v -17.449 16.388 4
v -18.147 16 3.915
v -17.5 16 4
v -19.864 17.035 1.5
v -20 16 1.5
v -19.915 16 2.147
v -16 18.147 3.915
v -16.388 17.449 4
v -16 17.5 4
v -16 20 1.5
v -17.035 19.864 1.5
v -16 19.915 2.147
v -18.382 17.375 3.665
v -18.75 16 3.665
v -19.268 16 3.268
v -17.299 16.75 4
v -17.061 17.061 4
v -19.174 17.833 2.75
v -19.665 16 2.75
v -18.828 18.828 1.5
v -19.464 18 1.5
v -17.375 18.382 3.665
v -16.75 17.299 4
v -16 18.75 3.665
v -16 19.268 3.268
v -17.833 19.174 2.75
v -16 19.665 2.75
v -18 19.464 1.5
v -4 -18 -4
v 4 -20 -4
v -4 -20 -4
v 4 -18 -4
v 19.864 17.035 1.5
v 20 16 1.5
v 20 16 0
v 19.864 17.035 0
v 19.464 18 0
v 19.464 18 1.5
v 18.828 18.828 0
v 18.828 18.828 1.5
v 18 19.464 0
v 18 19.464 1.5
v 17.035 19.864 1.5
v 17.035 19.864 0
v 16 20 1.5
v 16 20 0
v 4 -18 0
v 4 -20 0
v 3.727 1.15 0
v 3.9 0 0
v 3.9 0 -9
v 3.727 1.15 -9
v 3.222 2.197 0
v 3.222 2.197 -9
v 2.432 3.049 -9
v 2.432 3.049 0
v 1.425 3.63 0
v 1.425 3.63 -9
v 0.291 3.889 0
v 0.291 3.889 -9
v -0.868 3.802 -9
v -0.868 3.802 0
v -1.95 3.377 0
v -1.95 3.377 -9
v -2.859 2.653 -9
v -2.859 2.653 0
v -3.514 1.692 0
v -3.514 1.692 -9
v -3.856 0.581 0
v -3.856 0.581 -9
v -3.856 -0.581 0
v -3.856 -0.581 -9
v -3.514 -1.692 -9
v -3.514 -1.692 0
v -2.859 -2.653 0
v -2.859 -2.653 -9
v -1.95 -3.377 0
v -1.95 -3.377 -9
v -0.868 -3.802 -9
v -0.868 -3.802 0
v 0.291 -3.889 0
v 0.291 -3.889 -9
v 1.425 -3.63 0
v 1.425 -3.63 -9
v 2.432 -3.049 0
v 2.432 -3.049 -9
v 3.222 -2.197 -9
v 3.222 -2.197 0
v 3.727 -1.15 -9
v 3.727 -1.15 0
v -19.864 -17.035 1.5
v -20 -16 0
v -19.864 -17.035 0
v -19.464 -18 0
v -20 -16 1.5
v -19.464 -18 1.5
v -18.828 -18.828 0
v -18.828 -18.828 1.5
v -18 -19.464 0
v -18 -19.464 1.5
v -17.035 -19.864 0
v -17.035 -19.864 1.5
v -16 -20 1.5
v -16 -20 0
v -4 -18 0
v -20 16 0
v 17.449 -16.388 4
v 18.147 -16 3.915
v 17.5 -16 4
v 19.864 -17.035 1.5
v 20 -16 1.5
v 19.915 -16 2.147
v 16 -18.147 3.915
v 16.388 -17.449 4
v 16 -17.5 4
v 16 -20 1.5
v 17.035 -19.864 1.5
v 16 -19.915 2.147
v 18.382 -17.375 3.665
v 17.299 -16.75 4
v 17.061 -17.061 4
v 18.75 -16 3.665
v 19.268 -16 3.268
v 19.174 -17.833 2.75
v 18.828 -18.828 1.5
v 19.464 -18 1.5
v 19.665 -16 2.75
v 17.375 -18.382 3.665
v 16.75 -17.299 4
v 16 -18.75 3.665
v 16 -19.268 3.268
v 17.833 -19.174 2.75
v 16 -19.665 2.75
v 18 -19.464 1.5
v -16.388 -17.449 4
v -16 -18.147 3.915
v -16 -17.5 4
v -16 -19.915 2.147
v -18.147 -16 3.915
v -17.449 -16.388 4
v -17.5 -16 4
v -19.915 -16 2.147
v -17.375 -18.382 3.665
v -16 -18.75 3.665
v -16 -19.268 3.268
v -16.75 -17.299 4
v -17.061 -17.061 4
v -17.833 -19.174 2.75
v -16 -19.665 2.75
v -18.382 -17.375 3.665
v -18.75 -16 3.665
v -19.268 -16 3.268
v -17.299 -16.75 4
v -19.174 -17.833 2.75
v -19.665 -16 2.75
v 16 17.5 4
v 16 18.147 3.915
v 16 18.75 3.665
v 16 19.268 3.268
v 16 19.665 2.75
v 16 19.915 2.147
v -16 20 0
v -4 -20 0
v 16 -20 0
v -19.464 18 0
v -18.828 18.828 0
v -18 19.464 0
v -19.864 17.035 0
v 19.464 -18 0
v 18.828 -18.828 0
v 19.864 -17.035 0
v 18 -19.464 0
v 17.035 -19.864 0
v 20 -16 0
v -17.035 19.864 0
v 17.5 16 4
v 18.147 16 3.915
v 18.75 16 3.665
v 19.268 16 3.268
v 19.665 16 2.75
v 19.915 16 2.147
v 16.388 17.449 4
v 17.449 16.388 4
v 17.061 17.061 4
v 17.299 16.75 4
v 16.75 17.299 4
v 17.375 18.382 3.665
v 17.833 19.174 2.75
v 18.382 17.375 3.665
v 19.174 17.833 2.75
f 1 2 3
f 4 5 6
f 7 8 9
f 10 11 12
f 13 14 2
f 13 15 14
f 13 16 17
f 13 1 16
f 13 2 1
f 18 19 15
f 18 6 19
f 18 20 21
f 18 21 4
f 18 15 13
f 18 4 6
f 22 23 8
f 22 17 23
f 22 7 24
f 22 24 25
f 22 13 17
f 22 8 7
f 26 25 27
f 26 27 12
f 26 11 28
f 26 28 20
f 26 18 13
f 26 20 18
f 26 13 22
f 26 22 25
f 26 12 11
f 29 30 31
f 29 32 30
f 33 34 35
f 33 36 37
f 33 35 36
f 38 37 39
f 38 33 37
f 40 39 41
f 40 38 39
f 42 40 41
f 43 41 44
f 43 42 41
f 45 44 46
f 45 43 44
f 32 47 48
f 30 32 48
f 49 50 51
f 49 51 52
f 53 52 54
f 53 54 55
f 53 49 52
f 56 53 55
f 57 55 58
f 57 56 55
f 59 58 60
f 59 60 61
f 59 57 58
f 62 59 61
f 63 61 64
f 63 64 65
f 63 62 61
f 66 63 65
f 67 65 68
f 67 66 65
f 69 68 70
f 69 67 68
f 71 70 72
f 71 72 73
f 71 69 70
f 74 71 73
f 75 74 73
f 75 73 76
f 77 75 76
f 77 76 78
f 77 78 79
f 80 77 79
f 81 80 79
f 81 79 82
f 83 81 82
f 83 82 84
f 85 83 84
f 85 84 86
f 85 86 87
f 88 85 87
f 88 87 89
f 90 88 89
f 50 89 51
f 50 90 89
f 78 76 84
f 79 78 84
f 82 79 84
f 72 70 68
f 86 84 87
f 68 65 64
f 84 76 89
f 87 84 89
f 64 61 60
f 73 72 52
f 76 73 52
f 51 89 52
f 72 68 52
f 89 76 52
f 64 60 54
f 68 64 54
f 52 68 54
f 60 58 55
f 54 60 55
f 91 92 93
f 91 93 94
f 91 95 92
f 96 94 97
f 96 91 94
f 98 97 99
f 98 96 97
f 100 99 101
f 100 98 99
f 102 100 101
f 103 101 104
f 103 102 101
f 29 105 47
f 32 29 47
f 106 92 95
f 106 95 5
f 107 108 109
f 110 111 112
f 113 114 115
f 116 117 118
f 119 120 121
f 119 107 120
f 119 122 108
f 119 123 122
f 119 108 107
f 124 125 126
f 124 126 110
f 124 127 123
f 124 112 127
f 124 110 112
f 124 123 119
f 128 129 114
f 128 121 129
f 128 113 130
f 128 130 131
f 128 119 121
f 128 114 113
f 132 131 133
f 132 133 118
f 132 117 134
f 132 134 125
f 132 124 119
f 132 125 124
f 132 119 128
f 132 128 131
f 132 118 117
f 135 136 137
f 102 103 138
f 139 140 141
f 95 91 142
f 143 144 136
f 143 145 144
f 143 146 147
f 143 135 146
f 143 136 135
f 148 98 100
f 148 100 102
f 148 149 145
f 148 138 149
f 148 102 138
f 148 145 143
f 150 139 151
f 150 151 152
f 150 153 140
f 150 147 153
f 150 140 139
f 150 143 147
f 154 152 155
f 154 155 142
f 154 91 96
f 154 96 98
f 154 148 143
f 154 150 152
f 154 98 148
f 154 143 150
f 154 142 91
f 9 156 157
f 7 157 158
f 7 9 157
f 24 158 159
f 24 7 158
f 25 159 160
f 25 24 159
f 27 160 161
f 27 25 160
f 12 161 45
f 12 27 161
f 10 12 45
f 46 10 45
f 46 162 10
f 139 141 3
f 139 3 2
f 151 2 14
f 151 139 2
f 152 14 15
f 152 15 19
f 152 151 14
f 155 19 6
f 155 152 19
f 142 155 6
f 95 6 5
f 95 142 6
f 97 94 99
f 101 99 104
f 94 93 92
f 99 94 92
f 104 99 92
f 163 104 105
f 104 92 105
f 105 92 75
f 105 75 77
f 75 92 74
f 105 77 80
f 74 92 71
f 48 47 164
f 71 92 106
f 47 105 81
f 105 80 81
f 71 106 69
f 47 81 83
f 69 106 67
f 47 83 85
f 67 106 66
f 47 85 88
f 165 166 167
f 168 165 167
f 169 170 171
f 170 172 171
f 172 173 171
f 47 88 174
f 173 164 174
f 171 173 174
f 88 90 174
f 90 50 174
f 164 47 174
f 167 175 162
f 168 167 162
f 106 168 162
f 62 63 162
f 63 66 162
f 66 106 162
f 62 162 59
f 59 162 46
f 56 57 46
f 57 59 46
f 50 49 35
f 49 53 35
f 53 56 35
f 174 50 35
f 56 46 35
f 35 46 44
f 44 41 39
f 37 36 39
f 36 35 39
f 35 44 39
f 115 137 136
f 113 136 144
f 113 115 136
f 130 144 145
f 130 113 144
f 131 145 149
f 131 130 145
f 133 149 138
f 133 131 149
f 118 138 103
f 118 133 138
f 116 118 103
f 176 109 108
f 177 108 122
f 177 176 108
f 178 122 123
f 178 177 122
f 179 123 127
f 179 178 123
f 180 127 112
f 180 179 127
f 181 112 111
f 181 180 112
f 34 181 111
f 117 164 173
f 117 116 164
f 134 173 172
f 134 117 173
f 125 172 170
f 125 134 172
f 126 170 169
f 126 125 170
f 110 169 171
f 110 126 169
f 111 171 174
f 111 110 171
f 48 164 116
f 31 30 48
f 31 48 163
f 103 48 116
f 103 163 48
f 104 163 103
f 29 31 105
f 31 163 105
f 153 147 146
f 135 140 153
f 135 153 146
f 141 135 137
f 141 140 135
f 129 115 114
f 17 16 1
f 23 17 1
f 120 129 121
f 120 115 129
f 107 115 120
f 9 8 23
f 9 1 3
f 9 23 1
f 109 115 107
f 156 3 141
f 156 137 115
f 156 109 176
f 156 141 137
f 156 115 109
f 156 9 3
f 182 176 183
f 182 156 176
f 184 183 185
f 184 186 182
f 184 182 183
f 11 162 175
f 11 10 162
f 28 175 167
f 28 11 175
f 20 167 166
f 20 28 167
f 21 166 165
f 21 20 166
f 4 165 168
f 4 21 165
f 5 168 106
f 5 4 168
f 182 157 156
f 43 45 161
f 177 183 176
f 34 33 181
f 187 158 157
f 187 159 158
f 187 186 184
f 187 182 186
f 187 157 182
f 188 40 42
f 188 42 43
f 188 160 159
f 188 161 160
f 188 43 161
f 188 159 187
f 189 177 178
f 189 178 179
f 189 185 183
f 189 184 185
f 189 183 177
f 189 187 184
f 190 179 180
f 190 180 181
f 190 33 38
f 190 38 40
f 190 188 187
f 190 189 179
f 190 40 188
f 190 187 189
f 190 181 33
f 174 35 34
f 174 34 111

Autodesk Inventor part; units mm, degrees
ref_plane "YZ Plane" through (0, 0, 0) normal (1, 0, 0) x (0, 1, 0)
ref_plane "XZ Plane" through (0, 0, 0) normal (0, 1, 0) x (-1, 0, 0)
ref_plane "XY Plane" through (0, 0, 0) normal (0, 0, 1) x (1, 0, 0)
sketch "Sketch1" plane through (0, 0, 0) normal (0, 0, 1) x (1, 0, 0)
  line L0 (-20, 20) -> (20, 20)
  line L1 (20, 20) -> (20, -20)
  line L2 (20, -20) -> (-20, -20)
  line L3 (-20, -20) -> (-20, 20)
  point P0 (0, 0)
  point P1 (-20, 0)
  point P2 (0, 20)
  dimension "DimA" = 40
  dimension "DimB" = 40
extrude "Rectangluar End Cap" add sketch "Sketch1" along normal blind 4
sketch "Sketch6" plane through (0, 0, 4) normal (0, 0, 1) x (1, 0, 0)
  line L0 (-20, -20) -> (-20, 20) construction
  line L1 (20, -20) -> (-20, -20) construction
  circle A0 centre (0, 0) radius 3.9
  dimension "d37" = 20
  dimension "d38" = 20
  dimension "d39" = 7.8
extrude "Standard Post" add sketch "Sketch6" against normal blind 13
hole "Secure End Cap" [suppressed]
pattern_of_one "Rectangular Pattern3"
sketch "Sketch7" plane through (0, 0, 0) normal (0, 0, -1) x (-1, 0, 0)
  line L0 (-20, -20) -> (20, -20) construction
  line L1 (-4, -20) -> (4, -20)
  line L2 (4, -20) -> (4, -18)
  line L3 (4, -18) -> (-4, -18)
  line L4 (-4, -18) -> (-4, -20)
  line L5 (0, -18) -> (0, -20) construction
  point P0 (0, 0)
  dimension "d55" = 2
  dimension "d56" = 8
extrude "40x40 Orientation Tab" add sketch "Sketch7" along normal blind 4
fillet "Fillet5" radius 4 4 edges at (20, 20, 2) (-20, 20, 2) (-20, -20, 2) (20, -20, 2)
fillet "Fillet6" radius 2.5 8 edges at (-18.8284, -18.8284, 4) (0, -20, 4) (18.8284, -18.8284, 4) (20, 0, 4) (18.8284, 18.8284, 4) (0, 20, 4) (-18.8284, 18.8284, 4) (-20, 0, 4)
properties part number "18-813" material "Glass Filled Nylon"
